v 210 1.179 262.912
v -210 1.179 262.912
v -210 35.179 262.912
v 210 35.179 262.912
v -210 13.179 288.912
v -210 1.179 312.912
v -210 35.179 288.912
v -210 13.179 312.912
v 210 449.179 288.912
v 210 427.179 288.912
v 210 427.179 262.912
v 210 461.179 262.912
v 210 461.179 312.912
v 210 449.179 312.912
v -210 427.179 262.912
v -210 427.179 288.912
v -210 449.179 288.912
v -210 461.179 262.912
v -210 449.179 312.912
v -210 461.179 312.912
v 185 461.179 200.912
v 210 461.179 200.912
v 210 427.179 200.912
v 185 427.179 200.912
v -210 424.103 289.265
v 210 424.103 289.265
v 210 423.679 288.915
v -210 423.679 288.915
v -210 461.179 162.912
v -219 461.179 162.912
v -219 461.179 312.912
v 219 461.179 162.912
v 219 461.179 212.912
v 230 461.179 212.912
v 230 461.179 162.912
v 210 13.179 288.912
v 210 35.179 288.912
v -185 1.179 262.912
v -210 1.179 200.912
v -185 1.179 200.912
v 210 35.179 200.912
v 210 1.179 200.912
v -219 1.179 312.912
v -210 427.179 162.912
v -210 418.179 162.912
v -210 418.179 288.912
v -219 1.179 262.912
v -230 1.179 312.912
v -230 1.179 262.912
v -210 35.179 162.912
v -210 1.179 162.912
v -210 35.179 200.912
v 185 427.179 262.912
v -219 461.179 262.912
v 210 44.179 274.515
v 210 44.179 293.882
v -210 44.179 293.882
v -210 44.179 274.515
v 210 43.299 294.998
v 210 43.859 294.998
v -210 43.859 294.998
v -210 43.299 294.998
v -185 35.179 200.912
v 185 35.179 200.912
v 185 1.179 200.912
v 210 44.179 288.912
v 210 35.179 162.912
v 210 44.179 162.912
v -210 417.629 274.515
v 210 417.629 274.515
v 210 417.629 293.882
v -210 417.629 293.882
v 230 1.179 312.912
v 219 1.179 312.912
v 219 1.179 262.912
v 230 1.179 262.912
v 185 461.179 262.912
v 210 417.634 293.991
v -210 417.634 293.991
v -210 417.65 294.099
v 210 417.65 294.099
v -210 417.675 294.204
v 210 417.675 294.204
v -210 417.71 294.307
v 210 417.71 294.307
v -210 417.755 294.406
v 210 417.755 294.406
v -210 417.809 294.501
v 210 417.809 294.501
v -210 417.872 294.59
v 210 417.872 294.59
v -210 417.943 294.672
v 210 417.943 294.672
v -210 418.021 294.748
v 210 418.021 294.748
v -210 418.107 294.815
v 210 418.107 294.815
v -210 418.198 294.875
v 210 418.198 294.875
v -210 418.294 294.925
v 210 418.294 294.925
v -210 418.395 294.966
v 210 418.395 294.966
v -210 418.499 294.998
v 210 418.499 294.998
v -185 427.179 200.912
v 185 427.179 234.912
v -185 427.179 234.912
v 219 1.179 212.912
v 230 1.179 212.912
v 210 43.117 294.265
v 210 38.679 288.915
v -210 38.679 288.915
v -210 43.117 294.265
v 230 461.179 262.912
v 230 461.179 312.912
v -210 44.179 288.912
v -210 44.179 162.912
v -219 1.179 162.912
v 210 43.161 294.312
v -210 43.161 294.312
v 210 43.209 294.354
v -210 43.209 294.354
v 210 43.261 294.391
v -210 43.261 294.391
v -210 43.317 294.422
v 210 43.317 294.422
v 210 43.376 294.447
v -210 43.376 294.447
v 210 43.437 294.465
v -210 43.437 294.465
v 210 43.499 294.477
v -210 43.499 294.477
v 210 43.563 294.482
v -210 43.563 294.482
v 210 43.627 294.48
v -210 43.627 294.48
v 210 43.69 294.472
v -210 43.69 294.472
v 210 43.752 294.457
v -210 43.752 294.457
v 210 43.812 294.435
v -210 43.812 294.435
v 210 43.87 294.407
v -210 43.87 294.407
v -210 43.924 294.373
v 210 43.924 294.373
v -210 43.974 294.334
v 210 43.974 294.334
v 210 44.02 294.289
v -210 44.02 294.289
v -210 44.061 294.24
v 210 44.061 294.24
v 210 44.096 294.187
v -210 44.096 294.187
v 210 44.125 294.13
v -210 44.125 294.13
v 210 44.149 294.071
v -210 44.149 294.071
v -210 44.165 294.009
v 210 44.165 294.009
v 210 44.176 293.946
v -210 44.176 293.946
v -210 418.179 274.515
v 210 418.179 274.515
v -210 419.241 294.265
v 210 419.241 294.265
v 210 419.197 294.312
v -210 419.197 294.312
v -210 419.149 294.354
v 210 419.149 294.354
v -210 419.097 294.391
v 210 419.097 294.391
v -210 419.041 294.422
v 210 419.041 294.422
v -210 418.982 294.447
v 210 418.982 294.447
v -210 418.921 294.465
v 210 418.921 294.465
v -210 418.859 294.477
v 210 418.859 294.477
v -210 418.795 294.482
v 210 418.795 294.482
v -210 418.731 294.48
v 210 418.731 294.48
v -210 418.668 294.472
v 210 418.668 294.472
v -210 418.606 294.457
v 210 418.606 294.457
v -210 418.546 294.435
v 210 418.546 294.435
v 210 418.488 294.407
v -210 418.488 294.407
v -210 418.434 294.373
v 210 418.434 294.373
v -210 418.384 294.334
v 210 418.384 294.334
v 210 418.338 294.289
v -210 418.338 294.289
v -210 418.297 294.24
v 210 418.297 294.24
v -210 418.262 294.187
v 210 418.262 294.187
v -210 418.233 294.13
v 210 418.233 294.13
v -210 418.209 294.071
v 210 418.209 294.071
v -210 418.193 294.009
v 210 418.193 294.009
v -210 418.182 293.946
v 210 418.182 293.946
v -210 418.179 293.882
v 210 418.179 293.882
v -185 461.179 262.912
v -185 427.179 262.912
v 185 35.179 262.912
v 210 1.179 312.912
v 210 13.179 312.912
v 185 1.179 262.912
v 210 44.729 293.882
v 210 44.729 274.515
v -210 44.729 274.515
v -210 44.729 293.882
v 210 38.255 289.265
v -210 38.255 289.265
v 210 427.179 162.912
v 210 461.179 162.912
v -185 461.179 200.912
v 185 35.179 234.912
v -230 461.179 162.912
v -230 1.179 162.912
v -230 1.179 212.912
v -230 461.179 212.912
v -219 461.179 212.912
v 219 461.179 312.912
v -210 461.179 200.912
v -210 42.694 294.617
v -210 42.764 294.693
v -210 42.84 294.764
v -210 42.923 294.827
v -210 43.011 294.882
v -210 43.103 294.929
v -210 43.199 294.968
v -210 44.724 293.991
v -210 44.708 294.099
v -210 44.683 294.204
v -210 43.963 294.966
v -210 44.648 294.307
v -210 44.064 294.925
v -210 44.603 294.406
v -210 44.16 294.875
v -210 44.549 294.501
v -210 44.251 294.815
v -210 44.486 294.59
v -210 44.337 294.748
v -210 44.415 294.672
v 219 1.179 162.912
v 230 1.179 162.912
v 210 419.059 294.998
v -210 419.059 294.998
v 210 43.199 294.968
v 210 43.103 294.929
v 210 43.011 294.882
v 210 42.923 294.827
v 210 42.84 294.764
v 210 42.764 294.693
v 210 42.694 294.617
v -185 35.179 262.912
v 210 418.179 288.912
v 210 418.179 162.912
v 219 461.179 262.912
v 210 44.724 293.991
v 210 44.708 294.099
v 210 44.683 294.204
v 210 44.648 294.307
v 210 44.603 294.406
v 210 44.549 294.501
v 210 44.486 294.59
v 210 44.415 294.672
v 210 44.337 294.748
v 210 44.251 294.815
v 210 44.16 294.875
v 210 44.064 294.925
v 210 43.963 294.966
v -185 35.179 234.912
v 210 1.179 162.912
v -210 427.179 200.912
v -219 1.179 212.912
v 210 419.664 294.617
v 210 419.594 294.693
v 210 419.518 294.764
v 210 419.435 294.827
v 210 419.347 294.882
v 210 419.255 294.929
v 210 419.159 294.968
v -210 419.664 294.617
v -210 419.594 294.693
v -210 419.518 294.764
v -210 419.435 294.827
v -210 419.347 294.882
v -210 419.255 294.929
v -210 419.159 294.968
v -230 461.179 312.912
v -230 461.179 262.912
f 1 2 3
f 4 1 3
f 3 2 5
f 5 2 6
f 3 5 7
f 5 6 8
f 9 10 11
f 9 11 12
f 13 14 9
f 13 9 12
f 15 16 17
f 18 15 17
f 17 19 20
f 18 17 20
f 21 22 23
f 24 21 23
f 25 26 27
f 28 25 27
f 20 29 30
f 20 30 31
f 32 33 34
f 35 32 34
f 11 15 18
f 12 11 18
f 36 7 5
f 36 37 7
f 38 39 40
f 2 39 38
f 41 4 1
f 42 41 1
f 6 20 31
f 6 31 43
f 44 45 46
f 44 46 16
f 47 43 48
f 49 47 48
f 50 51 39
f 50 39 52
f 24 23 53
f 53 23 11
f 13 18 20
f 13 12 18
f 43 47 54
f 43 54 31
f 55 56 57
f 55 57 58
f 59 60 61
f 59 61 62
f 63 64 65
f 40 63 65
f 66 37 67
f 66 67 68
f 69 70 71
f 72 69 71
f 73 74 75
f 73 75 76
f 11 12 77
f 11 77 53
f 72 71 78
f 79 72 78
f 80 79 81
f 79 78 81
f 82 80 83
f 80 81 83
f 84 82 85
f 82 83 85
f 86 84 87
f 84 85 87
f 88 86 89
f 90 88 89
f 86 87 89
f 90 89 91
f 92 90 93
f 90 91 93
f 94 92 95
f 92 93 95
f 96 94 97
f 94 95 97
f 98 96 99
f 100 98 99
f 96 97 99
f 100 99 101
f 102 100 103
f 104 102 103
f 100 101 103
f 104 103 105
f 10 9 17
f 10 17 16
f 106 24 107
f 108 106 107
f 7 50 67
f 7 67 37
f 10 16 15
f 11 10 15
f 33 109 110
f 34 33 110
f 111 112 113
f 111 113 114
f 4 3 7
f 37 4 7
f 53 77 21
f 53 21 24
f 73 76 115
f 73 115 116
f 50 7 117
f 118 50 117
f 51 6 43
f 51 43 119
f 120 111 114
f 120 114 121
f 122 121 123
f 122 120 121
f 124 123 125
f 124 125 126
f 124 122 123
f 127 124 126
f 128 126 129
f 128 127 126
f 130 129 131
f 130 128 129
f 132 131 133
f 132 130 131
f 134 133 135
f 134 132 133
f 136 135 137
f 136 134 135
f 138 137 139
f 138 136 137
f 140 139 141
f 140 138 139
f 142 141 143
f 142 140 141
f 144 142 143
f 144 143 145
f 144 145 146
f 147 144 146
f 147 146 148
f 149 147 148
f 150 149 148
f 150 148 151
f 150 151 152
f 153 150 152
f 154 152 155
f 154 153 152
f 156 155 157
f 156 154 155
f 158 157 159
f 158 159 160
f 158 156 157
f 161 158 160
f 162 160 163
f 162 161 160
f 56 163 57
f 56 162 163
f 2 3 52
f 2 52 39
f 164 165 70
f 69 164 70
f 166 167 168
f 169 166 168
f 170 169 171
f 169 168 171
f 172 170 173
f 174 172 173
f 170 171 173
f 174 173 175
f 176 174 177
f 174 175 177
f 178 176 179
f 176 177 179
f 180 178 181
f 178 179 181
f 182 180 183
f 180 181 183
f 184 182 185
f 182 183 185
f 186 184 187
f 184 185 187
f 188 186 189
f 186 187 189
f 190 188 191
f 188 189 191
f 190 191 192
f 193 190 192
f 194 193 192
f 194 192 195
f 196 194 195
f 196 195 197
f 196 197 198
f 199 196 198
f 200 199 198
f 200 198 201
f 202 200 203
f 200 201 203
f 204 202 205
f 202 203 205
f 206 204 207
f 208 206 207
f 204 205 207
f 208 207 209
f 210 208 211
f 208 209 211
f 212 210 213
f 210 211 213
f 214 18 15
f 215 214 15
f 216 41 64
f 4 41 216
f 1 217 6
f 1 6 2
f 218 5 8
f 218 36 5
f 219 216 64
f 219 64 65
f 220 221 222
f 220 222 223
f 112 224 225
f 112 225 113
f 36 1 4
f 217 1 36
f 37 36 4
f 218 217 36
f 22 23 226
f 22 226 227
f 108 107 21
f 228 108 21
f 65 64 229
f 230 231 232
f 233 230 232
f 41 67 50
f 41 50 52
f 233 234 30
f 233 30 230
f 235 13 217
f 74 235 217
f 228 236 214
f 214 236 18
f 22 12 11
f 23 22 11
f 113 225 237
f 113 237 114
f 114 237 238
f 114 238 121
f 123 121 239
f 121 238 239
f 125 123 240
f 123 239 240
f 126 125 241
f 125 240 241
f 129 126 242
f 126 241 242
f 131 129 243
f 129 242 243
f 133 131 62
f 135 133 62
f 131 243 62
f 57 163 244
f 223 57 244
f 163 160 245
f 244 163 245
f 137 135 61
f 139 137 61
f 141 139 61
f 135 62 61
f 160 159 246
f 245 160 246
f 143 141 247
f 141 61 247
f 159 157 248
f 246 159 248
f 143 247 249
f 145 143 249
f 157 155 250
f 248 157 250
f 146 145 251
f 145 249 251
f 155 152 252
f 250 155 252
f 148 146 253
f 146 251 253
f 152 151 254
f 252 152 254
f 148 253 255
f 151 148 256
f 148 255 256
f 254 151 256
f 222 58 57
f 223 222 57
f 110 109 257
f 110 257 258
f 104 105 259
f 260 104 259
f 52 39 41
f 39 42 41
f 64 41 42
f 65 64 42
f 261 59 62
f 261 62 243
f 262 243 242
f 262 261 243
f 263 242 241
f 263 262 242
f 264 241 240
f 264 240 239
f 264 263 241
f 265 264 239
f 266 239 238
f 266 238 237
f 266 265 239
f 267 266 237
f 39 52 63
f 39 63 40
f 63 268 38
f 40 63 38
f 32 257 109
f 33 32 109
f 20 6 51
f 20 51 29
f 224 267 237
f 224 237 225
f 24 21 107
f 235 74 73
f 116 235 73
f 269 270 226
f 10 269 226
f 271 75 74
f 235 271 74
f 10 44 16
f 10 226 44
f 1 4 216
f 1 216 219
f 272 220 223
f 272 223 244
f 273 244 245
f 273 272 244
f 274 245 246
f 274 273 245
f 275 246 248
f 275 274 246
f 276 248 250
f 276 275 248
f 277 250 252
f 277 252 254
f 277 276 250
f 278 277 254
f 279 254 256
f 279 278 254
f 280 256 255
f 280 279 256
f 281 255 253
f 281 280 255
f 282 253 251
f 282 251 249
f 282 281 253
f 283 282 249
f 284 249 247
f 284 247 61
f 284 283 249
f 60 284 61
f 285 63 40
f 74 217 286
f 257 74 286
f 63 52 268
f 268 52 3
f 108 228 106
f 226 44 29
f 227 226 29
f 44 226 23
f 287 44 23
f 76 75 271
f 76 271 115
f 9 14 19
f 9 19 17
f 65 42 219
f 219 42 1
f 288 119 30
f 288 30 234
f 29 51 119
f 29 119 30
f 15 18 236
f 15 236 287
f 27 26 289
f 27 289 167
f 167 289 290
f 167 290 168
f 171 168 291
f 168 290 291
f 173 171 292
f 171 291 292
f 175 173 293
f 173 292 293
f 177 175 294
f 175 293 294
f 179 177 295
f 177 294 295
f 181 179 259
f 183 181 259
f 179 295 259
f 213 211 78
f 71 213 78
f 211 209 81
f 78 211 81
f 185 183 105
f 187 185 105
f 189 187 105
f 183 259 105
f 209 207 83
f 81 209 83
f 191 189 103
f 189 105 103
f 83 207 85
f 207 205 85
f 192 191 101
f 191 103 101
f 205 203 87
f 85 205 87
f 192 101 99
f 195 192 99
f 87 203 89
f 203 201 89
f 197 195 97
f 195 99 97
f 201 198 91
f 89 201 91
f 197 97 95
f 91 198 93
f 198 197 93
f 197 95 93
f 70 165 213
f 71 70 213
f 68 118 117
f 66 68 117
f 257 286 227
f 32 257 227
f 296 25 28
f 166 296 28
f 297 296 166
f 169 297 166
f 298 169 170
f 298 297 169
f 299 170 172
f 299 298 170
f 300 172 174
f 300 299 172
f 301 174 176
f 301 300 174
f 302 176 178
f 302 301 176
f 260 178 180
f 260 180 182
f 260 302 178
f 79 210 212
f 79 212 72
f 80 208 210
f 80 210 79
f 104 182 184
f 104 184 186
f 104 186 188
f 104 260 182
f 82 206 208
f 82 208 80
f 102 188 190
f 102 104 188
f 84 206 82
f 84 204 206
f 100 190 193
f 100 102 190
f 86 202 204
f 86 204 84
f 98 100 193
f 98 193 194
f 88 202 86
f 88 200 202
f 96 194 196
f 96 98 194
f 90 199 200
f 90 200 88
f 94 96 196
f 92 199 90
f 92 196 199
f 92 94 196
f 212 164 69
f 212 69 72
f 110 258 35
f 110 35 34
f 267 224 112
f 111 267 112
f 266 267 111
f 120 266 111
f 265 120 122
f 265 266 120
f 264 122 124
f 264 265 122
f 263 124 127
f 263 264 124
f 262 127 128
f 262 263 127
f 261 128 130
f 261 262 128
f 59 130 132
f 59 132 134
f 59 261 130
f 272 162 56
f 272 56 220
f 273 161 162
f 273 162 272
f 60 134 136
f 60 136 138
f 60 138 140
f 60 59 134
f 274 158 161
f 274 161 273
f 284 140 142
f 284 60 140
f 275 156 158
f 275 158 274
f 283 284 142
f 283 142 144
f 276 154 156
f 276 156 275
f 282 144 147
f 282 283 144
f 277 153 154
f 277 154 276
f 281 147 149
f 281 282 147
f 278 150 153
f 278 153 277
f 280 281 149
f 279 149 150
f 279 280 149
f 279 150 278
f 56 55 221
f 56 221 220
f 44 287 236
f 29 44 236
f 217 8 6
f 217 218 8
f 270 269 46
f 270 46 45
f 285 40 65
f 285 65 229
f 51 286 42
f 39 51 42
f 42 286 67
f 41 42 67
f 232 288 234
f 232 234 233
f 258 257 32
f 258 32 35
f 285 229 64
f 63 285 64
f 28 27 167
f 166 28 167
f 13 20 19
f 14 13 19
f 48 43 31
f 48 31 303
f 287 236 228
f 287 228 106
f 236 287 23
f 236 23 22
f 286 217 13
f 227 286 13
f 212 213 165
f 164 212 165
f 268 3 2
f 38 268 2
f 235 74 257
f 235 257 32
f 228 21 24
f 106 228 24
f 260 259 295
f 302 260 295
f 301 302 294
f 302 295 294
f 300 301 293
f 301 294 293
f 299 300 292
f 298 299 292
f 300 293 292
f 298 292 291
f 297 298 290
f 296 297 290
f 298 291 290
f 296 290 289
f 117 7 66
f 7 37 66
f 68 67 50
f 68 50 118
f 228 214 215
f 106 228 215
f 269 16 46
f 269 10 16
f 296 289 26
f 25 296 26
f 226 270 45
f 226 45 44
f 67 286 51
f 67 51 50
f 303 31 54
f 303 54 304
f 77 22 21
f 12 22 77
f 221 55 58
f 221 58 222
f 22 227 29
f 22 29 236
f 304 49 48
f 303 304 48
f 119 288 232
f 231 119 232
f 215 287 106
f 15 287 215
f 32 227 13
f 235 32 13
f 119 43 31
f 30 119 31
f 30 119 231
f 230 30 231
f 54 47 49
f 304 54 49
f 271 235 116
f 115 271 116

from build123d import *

# Parameters (mm, degrees)
F0_W      = 9
F0_H      = 126
F1_DEPTH  = 210
F2_W      = 34
F2_H      = 38
F3_DEPTH  = 210
F5_DEPTH  = 420
F9_DEPTH  = 9
F10_W     = 11
F10_H     = 50
F11_DEPTH = 460
F12_W     = 34
F12_H     = 62
F13_DEPTH = 25
F16_DEPTH = 370


# Not quite as in the source:
# - ends of sketch curves that miss each other by under 0.0002 mm in the source are joined


with BuildPart() as f1:
    # F0 (on Right) → F1 (new body, symmetric)
    with BuildSketch(Plane.YZ):
        with Locations((39.679, 225.9123)):
            Rectangle(F0_W, F0_H)
    extrude(amount=F1_DEPTH, both=True)


with BuildPart() as f1b:
    # F0 (on Right) → F1, piece 2 (new body, symmetric)
    with BuildSketch(Plane.YZ):
        Polygon((427.179, 288.9123), (418.179, 288.9123), (418.179, 162.9122999998), (427.1789405548, 162.9123), align=None)
    extrude(amount=F1_DEPTH, both=True)


with BuildPart() as f3:
    # F2 (on Right) → F3 (new body, symmetric)
    with BuildSketch(Plane.YZ):
        with Locations((18.179, 181.9123)):
            Rectangle(F2_W, F2_H)
    extrude(amount=F3_DEPTH, both=True)


with BuildPart() as f3b:
    # F2 (on Right) → F3, piece 2 (new body, symmetric)
    with BuildSketch(Plane.YZ):
        Polygon((13.179, 312.9123), (1.179, 312.9123), (1.179, 262.9123), (35.179, 262.9123), (35.179, 288.9123), (13.179, 288.9123), align=None)
    extrude(amount=F3_DEPTH, both=True)


with BuildPart() as f3c:
    # F2 (on Right) → F3, piece 3 (new body, symmetric)
    with BuildSketch(Plane.YZ):
        Polygon((461.179, 262.9123), (461.179, 312.9123), (449.179, 312.9123), (449.179, 288.9123), (427.179, 288.9123), (427.179, 262.9123), align=None)
    extrude(amount=F3_DEPTH, both=True)


with BuildPart() as f3d:
    # F2 (on Right) → F3, piece 4 (new body, symmetric)
    with BuildSketch(Plane.YZ):
        with Locations((444.179, 181.9123)):
            Rectangle(F2_W, F2_H)
    extrude(amount=F3_DEPTH, both=True)


with BuildPart() as f5:
    # F4 (on face) → F5 (new body, through all)
    with BuildSketch(Plane.YZ.offset(210)):
        with BuildLine():
            ThreePointArc((43.1172127334, 294.2653739331), (43.7826266683, 294.4466811128), (44.179, 293.8822910173))
            Line((44.179, 293.8822910173), (44.179, 274.5153307915))
            Line((44.179, 274.5153307915), (44.729, 274.5153307915))
            Line((44.729, 274.5153307915), (44.729, 293.8822910173))
            ThreePointArc((44.729, 293.8822910173), (44.4858001945, 294.5895486841), (43.8590636395, 294.9976673474))
            Line((43.8590636395, 294.9976673474), (43.2989363605, 294.9976673474))
            ThreePointArc((43.2989363605, 294.9976673474), (42.9660457898, 294.8553208915), (42.6939077391, 294.6165332727))
            Line((42.6939077391, 294.6165332727), (38.2546330976, 289.2652100541))
            Line((38.2546330976, 289.2652100541), (38.679, 288.9153307915))
            Line((38.679, 288.9153307915), (43.1172127334, 294.2653739331))
        make_face()
    extrude(amount=-F5_DEPTH)


with BuildPart() as f7_1:
    # F7: instance of F5
    add(f5.part.mirror(Plane(origin=(0, 231.179, 225.9122999999), x_dir=(-1, 0, 0), z_dir=(0, 1, 0))))


with BuildPart() as f9:
    # F8 (on face) → F9 (new body)
    with BuildSketch(Plane.YZ.offset(210)):
        Polygon((1.179, 312.9123), (1.179, 162.9123), (461.179, 162.9123), (461.179, 312.9123), (13.179, 312.9123), align=None)
    extrude(amount=F9_DEPTH)


with BuildPart() as f11:
    # F10 (on face) → F11 (new body, through all)
    with BuildSketch(Plane.XZ.offset(-1.179)):
        with Locations((224.5, 287.9123)):
            Rectangle(F10_W, F10_H)
    extrude(amount=-F11_DEPTH)


with BuildPart() as f11b:
    # F10 (on face) → F11, piece 2 (new body, through all)
    with BuildSketch(Plane.XZ.offset(-1.179)):
        with Locations((224.5, 187.9123)):
            Rectangle(F10_W, F10_H)
    extrude(amount=-F11_DEPTH)


with BuildPart() as f13:
    # F12 (on face) → F13 (new body)
    with BuildSketch(Plane(origin=(210, 0, 0), x_dir=(0, -1, 0), z_dir=(-1, 0, 0))):
        with Locations((-18.179, 231.9123)):
            Rectangle(F12_W, F12_H)
    extrude(amount=F13_DEPTH)


with BuildPart() as f13b:
    # F12 (on face) → F13, piece 2 (new body)
    with BuildSketch(Plane(origin=(210, 0, 0), x_dir=(0, -1, 0), z_dir=(-1, 0, 0))):
        with Locations((-444.179, 231.9123)):
            Rectangle(F12_W, F12_H)
    extrude(amount=F13_DEPTH)


with BuildPart() as f14_1:
    # F14: instance of F9
    add(f9.part.mirror(Plane.YZ))


with BuildPart() as f14_2:
    # F14: instance of F11b
    add(f11b.part.mirror(Plane.YZ))


with BuildPart() as f14_3:
    # F14: instance of F11
    add(f11.part.mirror(Plane.YZ))


with BuildPart() as f14_4:
    # F14: instance of F13
    add(f13.part.mirror(Plane.YZ))


with BuildPart() as f14_5:
    # F14: instance of F13b
    add(f13b.part.mirror(Plane.YZ))


with BuildPart() as f16:
    # F15 (on face) → F16 (new body, through all)
    with BuildSketch(Plane(origin=(185, 0, 0), x_dir=(0, -1, 0), z_dir=(-1, 0, 0))):
        Polygon((-35.179, 234.9123), (-35.179, 200.9123), (-1.179, 200.9123), align=None)
    extrude(amount=F16_DEPTH)


with BuildPart() as f16b:
    # F15 (on face) → F16, piece 2 (new body, through all)
    with BuildSketch(Plane(origin=(185, 0, 0), x_dir=(0, -1, 0), z_dir=(-1, 0, 0))):
        Polygon((-461.179, 200.9123), (-427.179, 200.9123), (-427.179, 234.9123), align=None)
    extrude(amount=F16_DEPTH)


solid = Compound([f1.part, f1b.part, f3.part, f3b.part, f3c.part, f3d.part, f5.part, f7_1.part, f9.part, f11.part, f11b.part, f13.part, f13b.part, f14_1.part, f14_2.part, f14_3.part, f14_4.part, f14_5.part, f16.part, f16b.part])
